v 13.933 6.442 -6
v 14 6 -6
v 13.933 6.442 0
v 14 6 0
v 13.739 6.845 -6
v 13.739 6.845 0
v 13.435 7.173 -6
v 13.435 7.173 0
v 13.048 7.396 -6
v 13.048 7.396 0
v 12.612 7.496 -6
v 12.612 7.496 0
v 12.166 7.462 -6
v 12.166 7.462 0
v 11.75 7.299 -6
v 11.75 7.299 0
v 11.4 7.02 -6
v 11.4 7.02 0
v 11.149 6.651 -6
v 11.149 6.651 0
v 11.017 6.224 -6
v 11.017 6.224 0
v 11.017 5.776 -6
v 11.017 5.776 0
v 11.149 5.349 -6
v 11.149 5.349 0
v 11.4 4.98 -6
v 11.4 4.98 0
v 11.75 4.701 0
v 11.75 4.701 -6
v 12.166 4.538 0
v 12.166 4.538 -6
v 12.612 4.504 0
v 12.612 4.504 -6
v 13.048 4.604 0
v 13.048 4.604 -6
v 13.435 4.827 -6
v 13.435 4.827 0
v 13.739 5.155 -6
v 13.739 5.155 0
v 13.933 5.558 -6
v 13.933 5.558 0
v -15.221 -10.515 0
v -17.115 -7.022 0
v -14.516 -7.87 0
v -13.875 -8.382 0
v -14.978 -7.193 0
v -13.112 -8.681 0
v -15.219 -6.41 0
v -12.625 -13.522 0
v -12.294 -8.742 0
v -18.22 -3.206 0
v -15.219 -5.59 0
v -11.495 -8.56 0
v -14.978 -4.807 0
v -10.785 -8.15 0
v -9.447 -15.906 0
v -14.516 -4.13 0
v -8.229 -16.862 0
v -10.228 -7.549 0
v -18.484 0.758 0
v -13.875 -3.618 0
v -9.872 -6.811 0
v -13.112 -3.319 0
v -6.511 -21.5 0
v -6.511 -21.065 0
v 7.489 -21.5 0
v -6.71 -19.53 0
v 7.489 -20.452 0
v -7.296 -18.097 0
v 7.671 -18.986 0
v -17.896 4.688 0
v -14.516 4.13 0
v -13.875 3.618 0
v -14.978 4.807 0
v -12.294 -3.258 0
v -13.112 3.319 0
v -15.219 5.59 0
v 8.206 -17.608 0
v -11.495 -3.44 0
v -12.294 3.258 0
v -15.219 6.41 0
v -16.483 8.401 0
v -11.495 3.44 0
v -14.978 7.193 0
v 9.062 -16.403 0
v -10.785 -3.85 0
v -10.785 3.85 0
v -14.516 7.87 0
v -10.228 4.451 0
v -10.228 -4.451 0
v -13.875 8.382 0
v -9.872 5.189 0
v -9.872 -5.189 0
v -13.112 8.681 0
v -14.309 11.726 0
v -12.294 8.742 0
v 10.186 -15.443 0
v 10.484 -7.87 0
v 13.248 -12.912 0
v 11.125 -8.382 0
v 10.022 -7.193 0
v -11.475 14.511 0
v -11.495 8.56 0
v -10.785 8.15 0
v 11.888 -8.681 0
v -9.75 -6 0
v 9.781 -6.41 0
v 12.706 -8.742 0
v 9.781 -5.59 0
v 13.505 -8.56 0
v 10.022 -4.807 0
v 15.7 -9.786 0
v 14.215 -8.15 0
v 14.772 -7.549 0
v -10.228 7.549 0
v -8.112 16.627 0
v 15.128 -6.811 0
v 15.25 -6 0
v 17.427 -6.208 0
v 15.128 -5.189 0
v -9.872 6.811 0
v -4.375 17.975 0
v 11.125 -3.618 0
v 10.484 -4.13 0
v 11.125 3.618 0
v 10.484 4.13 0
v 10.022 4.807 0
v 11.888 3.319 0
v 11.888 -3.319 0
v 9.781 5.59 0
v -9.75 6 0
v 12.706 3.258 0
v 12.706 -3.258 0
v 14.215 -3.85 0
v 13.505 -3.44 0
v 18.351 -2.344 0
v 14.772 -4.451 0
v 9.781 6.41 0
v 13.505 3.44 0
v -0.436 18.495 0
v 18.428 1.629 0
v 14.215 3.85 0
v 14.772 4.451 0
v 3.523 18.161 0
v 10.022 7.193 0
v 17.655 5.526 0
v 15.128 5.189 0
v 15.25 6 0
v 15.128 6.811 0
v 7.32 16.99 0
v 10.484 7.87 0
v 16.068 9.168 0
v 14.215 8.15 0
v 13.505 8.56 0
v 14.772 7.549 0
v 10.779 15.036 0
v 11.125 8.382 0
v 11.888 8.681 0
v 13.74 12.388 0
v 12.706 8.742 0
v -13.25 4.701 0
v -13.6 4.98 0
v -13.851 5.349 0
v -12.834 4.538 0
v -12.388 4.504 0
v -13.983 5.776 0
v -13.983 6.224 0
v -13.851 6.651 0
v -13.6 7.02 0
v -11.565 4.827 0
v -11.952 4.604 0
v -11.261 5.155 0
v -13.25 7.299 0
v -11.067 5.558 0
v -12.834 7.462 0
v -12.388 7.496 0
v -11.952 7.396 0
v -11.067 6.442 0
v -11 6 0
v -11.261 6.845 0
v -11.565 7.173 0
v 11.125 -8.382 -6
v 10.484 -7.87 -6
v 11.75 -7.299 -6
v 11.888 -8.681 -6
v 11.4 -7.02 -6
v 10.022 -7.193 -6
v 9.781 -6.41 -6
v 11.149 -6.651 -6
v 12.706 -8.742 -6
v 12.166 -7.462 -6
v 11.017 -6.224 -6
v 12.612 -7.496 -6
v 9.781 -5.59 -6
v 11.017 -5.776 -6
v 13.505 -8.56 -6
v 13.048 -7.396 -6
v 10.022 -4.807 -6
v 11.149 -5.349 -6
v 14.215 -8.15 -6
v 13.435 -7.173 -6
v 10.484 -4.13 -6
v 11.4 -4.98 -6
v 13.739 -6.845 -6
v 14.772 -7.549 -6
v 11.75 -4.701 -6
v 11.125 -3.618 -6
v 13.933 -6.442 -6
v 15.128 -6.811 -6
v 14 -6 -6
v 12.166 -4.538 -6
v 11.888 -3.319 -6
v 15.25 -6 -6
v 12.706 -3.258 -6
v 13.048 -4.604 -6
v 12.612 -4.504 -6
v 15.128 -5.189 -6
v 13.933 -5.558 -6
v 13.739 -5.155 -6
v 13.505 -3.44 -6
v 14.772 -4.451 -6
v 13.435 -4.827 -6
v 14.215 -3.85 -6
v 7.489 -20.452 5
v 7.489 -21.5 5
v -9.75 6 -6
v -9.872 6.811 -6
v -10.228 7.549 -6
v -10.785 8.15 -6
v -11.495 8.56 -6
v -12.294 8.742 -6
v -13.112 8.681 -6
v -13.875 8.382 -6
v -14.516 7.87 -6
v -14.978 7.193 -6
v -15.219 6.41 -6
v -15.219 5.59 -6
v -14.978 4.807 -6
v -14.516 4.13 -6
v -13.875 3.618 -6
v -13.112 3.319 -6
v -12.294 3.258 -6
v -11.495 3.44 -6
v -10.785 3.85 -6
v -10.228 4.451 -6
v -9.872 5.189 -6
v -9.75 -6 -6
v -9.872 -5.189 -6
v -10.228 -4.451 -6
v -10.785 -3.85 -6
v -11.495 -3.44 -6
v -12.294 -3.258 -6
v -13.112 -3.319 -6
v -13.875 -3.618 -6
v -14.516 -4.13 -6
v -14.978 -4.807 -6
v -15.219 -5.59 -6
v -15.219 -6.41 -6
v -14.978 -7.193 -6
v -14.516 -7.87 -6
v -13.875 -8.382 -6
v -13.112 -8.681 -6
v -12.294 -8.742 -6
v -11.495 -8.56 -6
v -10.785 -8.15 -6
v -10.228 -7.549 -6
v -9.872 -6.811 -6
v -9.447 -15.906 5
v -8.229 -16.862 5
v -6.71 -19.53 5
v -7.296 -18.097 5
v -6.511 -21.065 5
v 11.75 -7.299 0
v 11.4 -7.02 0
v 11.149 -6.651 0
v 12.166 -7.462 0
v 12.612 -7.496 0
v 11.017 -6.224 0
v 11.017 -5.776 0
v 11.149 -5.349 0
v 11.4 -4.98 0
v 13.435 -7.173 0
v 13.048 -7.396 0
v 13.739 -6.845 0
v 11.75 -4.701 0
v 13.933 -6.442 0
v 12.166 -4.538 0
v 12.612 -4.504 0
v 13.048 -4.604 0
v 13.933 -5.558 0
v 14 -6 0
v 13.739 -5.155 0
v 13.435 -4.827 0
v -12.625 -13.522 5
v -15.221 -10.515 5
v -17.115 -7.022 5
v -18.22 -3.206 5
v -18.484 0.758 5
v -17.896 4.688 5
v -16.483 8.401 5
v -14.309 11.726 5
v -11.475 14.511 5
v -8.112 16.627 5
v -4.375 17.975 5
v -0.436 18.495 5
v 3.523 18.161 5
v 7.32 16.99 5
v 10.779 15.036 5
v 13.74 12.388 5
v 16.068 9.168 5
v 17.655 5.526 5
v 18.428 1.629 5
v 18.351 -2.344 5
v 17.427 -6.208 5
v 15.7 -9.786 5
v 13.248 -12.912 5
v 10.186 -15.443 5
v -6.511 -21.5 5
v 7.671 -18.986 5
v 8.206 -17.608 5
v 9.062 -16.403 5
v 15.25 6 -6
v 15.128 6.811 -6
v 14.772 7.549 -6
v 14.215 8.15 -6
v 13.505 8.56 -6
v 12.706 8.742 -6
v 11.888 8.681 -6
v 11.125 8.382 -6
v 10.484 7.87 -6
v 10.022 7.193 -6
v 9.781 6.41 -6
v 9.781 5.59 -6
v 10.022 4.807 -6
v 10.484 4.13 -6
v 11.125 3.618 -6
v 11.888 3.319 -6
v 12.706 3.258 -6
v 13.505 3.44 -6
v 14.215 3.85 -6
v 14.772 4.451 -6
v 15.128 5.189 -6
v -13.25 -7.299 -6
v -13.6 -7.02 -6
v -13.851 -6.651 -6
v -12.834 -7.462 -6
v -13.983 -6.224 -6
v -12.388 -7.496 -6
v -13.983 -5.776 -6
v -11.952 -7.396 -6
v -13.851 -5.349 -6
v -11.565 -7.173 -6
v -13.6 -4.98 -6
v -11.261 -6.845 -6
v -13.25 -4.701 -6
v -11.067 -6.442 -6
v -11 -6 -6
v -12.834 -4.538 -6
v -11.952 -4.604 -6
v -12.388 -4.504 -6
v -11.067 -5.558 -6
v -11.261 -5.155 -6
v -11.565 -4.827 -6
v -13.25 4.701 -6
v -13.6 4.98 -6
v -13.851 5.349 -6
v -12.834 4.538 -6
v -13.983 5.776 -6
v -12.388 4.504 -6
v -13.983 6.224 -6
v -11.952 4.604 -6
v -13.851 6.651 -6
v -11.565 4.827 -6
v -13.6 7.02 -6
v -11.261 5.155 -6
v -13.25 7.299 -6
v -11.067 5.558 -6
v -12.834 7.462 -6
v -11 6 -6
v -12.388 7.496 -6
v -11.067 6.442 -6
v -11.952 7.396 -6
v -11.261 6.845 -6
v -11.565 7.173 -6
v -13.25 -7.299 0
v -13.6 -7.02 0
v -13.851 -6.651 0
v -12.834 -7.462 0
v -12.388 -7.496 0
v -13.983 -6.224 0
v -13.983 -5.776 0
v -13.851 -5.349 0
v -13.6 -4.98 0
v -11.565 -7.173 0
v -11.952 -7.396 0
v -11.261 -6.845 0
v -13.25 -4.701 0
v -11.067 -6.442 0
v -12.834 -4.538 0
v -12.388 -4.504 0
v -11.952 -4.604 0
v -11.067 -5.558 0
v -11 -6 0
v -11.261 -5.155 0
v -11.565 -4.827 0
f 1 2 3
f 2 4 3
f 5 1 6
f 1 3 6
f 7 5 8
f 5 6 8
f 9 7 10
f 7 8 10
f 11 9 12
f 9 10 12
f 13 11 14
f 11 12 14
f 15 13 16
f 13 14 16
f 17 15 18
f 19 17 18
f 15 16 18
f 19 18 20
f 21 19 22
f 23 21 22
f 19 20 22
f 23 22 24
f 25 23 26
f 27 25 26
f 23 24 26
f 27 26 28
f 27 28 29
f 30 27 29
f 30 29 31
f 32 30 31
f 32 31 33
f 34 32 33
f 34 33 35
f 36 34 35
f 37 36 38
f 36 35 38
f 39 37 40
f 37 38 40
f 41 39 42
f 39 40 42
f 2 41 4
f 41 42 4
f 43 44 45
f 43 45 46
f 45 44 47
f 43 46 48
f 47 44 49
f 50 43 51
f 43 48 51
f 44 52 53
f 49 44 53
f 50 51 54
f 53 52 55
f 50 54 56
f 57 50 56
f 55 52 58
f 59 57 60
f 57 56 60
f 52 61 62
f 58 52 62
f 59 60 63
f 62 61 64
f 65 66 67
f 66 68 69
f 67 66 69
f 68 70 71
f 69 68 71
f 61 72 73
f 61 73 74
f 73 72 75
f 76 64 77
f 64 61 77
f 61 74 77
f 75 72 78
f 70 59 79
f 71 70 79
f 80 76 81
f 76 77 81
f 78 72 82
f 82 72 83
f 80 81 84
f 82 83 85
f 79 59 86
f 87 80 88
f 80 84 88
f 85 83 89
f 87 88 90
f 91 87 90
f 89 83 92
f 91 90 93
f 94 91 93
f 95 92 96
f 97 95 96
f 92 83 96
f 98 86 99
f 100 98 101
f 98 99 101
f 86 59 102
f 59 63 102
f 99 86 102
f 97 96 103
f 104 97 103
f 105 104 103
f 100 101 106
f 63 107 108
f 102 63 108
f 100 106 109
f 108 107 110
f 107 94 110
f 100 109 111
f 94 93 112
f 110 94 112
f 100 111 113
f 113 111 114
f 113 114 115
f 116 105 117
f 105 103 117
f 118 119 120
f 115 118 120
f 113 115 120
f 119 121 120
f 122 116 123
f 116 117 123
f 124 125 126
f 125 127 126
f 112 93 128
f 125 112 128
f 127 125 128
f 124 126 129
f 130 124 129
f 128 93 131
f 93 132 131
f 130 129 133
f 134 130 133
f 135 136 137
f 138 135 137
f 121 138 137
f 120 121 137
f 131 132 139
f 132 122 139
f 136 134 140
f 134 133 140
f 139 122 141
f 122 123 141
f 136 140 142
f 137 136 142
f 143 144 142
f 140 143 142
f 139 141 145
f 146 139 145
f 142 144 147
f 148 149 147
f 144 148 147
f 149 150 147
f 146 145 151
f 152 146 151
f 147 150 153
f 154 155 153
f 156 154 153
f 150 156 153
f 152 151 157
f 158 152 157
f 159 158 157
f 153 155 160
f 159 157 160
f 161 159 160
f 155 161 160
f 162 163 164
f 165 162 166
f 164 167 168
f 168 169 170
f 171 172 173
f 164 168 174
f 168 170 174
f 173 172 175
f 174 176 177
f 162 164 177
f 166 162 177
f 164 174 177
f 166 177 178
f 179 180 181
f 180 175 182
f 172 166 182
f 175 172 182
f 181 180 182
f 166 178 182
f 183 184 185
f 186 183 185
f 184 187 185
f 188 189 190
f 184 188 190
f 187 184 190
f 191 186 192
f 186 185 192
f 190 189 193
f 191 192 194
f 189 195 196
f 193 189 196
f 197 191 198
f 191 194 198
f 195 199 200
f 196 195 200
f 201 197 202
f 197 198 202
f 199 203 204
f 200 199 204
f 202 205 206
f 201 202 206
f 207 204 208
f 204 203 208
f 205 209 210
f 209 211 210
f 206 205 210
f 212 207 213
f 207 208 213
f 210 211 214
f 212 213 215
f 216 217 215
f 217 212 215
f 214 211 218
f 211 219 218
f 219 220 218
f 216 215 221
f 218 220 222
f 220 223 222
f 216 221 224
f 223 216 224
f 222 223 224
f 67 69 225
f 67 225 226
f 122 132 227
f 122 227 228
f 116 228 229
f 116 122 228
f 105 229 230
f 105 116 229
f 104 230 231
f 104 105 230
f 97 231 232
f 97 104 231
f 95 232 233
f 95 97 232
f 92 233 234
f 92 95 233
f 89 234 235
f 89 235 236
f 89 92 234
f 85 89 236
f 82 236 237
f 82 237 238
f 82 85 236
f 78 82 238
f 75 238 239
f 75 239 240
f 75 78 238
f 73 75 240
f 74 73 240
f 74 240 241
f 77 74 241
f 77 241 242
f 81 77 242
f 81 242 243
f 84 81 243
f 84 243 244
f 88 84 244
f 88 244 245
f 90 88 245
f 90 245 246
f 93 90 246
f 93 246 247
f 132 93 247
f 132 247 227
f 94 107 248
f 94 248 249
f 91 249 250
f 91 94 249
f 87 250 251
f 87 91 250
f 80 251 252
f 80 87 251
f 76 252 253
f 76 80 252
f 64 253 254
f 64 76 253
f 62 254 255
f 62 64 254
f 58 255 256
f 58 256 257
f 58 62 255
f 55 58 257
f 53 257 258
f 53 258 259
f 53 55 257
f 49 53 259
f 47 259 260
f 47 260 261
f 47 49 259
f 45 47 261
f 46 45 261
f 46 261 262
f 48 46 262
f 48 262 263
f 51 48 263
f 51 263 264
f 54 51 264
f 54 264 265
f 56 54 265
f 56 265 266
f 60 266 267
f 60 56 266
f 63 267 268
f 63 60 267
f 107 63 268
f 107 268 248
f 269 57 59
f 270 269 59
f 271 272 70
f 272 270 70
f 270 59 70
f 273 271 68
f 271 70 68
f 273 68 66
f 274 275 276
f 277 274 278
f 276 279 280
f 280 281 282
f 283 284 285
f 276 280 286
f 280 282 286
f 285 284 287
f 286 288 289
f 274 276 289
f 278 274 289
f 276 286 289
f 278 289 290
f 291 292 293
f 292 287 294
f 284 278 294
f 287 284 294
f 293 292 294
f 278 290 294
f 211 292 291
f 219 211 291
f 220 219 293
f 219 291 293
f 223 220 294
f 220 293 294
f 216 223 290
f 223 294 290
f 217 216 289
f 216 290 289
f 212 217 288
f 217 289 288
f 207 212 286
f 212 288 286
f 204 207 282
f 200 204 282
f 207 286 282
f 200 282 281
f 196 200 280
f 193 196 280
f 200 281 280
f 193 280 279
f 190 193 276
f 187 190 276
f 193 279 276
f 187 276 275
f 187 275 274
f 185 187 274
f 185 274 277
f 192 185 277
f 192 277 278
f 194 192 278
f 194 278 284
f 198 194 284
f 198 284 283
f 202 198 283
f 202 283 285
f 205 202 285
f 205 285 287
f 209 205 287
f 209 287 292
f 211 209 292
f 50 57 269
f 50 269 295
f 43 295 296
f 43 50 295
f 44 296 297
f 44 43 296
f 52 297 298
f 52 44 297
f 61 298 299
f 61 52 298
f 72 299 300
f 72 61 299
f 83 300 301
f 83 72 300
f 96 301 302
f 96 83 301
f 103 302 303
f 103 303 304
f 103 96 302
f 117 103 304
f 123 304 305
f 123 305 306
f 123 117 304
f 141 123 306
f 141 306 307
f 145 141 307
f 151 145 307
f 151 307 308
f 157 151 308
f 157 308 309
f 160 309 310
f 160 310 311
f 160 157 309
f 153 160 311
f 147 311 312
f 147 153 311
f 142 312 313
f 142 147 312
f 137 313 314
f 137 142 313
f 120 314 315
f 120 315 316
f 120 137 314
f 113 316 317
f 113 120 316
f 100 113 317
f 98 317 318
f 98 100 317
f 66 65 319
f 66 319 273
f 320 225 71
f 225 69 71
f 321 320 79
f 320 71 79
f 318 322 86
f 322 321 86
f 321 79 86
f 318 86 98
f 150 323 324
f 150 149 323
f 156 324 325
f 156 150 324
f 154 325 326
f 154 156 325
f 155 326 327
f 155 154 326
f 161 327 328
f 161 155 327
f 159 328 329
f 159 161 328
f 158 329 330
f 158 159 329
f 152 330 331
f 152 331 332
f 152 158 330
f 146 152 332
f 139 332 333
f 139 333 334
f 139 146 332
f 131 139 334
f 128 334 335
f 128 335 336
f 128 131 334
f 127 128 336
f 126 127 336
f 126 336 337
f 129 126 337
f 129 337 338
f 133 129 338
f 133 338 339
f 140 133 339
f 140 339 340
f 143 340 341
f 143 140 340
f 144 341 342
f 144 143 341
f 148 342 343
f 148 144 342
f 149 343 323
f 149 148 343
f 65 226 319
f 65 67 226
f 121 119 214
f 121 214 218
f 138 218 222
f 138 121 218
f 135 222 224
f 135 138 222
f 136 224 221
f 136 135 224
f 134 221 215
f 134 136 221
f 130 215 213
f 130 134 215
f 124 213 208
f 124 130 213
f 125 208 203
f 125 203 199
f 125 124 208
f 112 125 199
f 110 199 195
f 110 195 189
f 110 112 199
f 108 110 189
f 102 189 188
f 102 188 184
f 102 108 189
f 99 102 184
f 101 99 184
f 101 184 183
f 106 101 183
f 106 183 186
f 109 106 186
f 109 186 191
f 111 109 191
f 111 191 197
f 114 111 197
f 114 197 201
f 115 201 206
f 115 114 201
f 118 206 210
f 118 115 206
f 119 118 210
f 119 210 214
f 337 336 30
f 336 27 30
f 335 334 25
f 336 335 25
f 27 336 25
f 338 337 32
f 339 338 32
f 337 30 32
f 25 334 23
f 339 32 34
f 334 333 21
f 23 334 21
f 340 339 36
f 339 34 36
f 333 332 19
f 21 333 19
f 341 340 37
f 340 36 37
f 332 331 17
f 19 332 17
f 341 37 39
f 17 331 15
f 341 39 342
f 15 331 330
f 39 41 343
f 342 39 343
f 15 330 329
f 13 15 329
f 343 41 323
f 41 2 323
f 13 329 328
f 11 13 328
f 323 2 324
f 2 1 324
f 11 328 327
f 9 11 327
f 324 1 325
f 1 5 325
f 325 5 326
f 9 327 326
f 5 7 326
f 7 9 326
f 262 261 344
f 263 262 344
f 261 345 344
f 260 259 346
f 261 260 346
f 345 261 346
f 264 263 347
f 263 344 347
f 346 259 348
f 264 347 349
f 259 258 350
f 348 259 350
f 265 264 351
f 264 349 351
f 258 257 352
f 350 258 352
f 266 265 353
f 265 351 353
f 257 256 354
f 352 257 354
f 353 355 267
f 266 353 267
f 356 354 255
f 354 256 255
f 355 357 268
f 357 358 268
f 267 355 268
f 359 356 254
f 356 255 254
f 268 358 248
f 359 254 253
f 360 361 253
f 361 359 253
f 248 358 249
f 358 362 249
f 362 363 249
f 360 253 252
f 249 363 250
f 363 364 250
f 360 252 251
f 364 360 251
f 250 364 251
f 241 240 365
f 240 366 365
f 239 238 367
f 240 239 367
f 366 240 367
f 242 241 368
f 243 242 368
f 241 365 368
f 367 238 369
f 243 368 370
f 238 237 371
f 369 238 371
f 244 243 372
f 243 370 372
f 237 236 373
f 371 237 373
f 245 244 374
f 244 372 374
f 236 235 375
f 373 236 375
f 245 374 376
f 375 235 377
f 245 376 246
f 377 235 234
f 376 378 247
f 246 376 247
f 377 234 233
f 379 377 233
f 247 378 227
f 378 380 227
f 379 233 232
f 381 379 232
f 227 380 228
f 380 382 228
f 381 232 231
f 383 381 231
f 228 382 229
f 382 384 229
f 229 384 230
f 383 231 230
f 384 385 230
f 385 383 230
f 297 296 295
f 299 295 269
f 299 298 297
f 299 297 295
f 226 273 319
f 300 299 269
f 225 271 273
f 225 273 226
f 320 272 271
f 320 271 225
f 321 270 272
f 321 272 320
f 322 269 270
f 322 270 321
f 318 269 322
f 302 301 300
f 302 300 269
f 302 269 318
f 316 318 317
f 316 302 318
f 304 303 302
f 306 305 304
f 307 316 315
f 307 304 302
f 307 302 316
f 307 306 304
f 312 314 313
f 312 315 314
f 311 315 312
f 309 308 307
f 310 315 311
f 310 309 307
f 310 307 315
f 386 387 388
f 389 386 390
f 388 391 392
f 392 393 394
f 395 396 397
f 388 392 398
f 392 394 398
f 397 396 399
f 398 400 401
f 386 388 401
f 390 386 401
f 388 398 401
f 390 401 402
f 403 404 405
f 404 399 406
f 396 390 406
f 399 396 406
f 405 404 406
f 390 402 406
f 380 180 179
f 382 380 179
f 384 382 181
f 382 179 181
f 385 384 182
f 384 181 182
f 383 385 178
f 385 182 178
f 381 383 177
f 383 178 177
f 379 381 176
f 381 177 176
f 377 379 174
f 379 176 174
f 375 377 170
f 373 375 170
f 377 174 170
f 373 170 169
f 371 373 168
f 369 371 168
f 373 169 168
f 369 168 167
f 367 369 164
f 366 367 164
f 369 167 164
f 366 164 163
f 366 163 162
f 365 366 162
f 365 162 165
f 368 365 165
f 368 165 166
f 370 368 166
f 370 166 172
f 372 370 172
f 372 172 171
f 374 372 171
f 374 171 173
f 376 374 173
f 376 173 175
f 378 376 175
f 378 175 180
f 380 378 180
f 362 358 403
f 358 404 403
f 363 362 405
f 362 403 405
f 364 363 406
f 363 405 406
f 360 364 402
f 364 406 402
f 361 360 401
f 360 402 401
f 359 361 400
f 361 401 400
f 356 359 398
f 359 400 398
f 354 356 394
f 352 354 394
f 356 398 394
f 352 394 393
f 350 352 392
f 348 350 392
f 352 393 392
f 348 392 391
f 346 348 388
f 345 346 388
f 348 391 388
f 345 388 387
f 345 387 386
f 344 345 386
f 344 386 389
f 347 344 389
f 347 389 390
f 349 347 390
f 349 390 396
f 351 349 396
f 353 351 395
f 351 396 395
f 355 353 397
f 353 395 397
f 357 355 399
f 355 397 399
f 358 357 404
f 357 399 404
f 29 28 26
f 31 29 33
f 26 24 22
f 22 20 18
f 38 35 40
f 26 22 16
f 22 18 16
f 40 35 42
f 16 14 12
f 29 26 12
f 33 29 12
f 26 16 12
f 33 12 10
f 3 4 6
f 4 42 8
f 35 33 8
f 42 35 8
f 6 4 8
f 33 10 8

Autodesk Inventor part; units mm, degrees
ref_plane "YZ Plane" through (0, 0, 0) normal (1, 0, 0) x (0, 1, 0)
ref_plane "XZ Plane" through (0, 0, 0) normal (0, 1, 0) x (-1, 0, 0)
ref_plane "XY Plane" through (0, 0, 0) normal (0, 0, 1) x (1, 0, 0)
sketch "Náčrt1" plane through (0, 0, 0) normal (0, 0, 1) x (1, 0, 0)
  arc A0 (10.1858, -15.4434) -> (-9.4468, -15.9062) centre (0, 0) ccw
  line L0 (7.4894, -20.4521) -> (7.4894, -21.5)
  line L1 (7.4894, -21.5) -> (-6.5106, -21.5)
  line L2 (-6.5106, -21.5) -> (-6.5106, -21.065)
  line L3 (0, -18.5) -> (7.4894, -21.5) construction
  line L4 (0, -18.5) -> (-6.5106, -21.5) construction
  line L5 (0, 18.5) -> (0, -37.4433)
  arc A1 (-6.5106, -21.065) -> (-9.4468, -15.9062) centre (-12.5106, -21.065) ccw
  arc A2 (10.1858, -15.4434) -> (7.4894, -20.4521) centre (13.4894, -20.4521) ccw
  line L6 (-12.5, 6) -> (12.5, 6)
  line L7 (12.5, 6) -> (12.5, -6)
  line L8 (12.5, -6) -> (-12.5, -6)
  line L9 (-12.5, -6) -> (-12.5, 6)
  line L10 (-12.5, 6) -> (12.5, -6) construction
  line L11 (12.5, 6) -> (-12.5, -6) construction
  circle A3 centre (-12.5, 6) radius 1.5
  circle A4 centre (12.5, 6) radius 1.5
  circle A5 centre (12.5, -6) radius 1.5
  circle A6 centre (-12.5, -6) radius 1.5
  circle A7 centre (-12.5, 6) radius 2.75
  circle A8 centre (12.5, 6) radius 2.75
  circle A9 centre (12.5, -6) radius 2.75
  circle A10 centre (-12.5, -6) radius 2.75
  point P0 (7.4894, -16.9162)
  point P1 (-6.5106, -17.3165)
  dimension "d0" = 37
  dimension "d1" = 14
  dimension "d2" = 21.5
  dimension "d3" = 6
  dimension "d4" = 25
  dimension "d5" = 12
  dimension "d6" = 3
  dimension "d7" = 3
  dimension "d8" = 3
  dimension "d9" = 3
  dimension "d10" = 5.5
  dimension "d11" = 5.5
  dimension "d12" = 5.5
  dimension "d13" = 5.5
extrude "Vysunutí1" add sketch "Náčrt1" along normal blind 5
extrude "Vysunutí2" add sketch "Náčrt1" against normal blind 6 contours A7 L9 A3 L6 | L6 A3 L9 A7 | A8 L7 A4 L6 | L6 A4 L7 A8 | A9 L7 A5 L8 | L8 A5 L7 A9 | A10 L9 A6 L8 | L8 A6 L9 A10
thread "Závit1" size "M3x0.5" class "6H" standard "ISO Metric profile" full length
thread "Závit2" size "M3x0.5" class "6H" standard "ISO Metric profile" full length
thread "Závit3" size "M3x0.5" class "6H" standard "ISO Metric profile" full length
thread "Závit4" size "M3x0.5" class "6H" standard "ISO Metric profile" full length
properties part number "Disp"
